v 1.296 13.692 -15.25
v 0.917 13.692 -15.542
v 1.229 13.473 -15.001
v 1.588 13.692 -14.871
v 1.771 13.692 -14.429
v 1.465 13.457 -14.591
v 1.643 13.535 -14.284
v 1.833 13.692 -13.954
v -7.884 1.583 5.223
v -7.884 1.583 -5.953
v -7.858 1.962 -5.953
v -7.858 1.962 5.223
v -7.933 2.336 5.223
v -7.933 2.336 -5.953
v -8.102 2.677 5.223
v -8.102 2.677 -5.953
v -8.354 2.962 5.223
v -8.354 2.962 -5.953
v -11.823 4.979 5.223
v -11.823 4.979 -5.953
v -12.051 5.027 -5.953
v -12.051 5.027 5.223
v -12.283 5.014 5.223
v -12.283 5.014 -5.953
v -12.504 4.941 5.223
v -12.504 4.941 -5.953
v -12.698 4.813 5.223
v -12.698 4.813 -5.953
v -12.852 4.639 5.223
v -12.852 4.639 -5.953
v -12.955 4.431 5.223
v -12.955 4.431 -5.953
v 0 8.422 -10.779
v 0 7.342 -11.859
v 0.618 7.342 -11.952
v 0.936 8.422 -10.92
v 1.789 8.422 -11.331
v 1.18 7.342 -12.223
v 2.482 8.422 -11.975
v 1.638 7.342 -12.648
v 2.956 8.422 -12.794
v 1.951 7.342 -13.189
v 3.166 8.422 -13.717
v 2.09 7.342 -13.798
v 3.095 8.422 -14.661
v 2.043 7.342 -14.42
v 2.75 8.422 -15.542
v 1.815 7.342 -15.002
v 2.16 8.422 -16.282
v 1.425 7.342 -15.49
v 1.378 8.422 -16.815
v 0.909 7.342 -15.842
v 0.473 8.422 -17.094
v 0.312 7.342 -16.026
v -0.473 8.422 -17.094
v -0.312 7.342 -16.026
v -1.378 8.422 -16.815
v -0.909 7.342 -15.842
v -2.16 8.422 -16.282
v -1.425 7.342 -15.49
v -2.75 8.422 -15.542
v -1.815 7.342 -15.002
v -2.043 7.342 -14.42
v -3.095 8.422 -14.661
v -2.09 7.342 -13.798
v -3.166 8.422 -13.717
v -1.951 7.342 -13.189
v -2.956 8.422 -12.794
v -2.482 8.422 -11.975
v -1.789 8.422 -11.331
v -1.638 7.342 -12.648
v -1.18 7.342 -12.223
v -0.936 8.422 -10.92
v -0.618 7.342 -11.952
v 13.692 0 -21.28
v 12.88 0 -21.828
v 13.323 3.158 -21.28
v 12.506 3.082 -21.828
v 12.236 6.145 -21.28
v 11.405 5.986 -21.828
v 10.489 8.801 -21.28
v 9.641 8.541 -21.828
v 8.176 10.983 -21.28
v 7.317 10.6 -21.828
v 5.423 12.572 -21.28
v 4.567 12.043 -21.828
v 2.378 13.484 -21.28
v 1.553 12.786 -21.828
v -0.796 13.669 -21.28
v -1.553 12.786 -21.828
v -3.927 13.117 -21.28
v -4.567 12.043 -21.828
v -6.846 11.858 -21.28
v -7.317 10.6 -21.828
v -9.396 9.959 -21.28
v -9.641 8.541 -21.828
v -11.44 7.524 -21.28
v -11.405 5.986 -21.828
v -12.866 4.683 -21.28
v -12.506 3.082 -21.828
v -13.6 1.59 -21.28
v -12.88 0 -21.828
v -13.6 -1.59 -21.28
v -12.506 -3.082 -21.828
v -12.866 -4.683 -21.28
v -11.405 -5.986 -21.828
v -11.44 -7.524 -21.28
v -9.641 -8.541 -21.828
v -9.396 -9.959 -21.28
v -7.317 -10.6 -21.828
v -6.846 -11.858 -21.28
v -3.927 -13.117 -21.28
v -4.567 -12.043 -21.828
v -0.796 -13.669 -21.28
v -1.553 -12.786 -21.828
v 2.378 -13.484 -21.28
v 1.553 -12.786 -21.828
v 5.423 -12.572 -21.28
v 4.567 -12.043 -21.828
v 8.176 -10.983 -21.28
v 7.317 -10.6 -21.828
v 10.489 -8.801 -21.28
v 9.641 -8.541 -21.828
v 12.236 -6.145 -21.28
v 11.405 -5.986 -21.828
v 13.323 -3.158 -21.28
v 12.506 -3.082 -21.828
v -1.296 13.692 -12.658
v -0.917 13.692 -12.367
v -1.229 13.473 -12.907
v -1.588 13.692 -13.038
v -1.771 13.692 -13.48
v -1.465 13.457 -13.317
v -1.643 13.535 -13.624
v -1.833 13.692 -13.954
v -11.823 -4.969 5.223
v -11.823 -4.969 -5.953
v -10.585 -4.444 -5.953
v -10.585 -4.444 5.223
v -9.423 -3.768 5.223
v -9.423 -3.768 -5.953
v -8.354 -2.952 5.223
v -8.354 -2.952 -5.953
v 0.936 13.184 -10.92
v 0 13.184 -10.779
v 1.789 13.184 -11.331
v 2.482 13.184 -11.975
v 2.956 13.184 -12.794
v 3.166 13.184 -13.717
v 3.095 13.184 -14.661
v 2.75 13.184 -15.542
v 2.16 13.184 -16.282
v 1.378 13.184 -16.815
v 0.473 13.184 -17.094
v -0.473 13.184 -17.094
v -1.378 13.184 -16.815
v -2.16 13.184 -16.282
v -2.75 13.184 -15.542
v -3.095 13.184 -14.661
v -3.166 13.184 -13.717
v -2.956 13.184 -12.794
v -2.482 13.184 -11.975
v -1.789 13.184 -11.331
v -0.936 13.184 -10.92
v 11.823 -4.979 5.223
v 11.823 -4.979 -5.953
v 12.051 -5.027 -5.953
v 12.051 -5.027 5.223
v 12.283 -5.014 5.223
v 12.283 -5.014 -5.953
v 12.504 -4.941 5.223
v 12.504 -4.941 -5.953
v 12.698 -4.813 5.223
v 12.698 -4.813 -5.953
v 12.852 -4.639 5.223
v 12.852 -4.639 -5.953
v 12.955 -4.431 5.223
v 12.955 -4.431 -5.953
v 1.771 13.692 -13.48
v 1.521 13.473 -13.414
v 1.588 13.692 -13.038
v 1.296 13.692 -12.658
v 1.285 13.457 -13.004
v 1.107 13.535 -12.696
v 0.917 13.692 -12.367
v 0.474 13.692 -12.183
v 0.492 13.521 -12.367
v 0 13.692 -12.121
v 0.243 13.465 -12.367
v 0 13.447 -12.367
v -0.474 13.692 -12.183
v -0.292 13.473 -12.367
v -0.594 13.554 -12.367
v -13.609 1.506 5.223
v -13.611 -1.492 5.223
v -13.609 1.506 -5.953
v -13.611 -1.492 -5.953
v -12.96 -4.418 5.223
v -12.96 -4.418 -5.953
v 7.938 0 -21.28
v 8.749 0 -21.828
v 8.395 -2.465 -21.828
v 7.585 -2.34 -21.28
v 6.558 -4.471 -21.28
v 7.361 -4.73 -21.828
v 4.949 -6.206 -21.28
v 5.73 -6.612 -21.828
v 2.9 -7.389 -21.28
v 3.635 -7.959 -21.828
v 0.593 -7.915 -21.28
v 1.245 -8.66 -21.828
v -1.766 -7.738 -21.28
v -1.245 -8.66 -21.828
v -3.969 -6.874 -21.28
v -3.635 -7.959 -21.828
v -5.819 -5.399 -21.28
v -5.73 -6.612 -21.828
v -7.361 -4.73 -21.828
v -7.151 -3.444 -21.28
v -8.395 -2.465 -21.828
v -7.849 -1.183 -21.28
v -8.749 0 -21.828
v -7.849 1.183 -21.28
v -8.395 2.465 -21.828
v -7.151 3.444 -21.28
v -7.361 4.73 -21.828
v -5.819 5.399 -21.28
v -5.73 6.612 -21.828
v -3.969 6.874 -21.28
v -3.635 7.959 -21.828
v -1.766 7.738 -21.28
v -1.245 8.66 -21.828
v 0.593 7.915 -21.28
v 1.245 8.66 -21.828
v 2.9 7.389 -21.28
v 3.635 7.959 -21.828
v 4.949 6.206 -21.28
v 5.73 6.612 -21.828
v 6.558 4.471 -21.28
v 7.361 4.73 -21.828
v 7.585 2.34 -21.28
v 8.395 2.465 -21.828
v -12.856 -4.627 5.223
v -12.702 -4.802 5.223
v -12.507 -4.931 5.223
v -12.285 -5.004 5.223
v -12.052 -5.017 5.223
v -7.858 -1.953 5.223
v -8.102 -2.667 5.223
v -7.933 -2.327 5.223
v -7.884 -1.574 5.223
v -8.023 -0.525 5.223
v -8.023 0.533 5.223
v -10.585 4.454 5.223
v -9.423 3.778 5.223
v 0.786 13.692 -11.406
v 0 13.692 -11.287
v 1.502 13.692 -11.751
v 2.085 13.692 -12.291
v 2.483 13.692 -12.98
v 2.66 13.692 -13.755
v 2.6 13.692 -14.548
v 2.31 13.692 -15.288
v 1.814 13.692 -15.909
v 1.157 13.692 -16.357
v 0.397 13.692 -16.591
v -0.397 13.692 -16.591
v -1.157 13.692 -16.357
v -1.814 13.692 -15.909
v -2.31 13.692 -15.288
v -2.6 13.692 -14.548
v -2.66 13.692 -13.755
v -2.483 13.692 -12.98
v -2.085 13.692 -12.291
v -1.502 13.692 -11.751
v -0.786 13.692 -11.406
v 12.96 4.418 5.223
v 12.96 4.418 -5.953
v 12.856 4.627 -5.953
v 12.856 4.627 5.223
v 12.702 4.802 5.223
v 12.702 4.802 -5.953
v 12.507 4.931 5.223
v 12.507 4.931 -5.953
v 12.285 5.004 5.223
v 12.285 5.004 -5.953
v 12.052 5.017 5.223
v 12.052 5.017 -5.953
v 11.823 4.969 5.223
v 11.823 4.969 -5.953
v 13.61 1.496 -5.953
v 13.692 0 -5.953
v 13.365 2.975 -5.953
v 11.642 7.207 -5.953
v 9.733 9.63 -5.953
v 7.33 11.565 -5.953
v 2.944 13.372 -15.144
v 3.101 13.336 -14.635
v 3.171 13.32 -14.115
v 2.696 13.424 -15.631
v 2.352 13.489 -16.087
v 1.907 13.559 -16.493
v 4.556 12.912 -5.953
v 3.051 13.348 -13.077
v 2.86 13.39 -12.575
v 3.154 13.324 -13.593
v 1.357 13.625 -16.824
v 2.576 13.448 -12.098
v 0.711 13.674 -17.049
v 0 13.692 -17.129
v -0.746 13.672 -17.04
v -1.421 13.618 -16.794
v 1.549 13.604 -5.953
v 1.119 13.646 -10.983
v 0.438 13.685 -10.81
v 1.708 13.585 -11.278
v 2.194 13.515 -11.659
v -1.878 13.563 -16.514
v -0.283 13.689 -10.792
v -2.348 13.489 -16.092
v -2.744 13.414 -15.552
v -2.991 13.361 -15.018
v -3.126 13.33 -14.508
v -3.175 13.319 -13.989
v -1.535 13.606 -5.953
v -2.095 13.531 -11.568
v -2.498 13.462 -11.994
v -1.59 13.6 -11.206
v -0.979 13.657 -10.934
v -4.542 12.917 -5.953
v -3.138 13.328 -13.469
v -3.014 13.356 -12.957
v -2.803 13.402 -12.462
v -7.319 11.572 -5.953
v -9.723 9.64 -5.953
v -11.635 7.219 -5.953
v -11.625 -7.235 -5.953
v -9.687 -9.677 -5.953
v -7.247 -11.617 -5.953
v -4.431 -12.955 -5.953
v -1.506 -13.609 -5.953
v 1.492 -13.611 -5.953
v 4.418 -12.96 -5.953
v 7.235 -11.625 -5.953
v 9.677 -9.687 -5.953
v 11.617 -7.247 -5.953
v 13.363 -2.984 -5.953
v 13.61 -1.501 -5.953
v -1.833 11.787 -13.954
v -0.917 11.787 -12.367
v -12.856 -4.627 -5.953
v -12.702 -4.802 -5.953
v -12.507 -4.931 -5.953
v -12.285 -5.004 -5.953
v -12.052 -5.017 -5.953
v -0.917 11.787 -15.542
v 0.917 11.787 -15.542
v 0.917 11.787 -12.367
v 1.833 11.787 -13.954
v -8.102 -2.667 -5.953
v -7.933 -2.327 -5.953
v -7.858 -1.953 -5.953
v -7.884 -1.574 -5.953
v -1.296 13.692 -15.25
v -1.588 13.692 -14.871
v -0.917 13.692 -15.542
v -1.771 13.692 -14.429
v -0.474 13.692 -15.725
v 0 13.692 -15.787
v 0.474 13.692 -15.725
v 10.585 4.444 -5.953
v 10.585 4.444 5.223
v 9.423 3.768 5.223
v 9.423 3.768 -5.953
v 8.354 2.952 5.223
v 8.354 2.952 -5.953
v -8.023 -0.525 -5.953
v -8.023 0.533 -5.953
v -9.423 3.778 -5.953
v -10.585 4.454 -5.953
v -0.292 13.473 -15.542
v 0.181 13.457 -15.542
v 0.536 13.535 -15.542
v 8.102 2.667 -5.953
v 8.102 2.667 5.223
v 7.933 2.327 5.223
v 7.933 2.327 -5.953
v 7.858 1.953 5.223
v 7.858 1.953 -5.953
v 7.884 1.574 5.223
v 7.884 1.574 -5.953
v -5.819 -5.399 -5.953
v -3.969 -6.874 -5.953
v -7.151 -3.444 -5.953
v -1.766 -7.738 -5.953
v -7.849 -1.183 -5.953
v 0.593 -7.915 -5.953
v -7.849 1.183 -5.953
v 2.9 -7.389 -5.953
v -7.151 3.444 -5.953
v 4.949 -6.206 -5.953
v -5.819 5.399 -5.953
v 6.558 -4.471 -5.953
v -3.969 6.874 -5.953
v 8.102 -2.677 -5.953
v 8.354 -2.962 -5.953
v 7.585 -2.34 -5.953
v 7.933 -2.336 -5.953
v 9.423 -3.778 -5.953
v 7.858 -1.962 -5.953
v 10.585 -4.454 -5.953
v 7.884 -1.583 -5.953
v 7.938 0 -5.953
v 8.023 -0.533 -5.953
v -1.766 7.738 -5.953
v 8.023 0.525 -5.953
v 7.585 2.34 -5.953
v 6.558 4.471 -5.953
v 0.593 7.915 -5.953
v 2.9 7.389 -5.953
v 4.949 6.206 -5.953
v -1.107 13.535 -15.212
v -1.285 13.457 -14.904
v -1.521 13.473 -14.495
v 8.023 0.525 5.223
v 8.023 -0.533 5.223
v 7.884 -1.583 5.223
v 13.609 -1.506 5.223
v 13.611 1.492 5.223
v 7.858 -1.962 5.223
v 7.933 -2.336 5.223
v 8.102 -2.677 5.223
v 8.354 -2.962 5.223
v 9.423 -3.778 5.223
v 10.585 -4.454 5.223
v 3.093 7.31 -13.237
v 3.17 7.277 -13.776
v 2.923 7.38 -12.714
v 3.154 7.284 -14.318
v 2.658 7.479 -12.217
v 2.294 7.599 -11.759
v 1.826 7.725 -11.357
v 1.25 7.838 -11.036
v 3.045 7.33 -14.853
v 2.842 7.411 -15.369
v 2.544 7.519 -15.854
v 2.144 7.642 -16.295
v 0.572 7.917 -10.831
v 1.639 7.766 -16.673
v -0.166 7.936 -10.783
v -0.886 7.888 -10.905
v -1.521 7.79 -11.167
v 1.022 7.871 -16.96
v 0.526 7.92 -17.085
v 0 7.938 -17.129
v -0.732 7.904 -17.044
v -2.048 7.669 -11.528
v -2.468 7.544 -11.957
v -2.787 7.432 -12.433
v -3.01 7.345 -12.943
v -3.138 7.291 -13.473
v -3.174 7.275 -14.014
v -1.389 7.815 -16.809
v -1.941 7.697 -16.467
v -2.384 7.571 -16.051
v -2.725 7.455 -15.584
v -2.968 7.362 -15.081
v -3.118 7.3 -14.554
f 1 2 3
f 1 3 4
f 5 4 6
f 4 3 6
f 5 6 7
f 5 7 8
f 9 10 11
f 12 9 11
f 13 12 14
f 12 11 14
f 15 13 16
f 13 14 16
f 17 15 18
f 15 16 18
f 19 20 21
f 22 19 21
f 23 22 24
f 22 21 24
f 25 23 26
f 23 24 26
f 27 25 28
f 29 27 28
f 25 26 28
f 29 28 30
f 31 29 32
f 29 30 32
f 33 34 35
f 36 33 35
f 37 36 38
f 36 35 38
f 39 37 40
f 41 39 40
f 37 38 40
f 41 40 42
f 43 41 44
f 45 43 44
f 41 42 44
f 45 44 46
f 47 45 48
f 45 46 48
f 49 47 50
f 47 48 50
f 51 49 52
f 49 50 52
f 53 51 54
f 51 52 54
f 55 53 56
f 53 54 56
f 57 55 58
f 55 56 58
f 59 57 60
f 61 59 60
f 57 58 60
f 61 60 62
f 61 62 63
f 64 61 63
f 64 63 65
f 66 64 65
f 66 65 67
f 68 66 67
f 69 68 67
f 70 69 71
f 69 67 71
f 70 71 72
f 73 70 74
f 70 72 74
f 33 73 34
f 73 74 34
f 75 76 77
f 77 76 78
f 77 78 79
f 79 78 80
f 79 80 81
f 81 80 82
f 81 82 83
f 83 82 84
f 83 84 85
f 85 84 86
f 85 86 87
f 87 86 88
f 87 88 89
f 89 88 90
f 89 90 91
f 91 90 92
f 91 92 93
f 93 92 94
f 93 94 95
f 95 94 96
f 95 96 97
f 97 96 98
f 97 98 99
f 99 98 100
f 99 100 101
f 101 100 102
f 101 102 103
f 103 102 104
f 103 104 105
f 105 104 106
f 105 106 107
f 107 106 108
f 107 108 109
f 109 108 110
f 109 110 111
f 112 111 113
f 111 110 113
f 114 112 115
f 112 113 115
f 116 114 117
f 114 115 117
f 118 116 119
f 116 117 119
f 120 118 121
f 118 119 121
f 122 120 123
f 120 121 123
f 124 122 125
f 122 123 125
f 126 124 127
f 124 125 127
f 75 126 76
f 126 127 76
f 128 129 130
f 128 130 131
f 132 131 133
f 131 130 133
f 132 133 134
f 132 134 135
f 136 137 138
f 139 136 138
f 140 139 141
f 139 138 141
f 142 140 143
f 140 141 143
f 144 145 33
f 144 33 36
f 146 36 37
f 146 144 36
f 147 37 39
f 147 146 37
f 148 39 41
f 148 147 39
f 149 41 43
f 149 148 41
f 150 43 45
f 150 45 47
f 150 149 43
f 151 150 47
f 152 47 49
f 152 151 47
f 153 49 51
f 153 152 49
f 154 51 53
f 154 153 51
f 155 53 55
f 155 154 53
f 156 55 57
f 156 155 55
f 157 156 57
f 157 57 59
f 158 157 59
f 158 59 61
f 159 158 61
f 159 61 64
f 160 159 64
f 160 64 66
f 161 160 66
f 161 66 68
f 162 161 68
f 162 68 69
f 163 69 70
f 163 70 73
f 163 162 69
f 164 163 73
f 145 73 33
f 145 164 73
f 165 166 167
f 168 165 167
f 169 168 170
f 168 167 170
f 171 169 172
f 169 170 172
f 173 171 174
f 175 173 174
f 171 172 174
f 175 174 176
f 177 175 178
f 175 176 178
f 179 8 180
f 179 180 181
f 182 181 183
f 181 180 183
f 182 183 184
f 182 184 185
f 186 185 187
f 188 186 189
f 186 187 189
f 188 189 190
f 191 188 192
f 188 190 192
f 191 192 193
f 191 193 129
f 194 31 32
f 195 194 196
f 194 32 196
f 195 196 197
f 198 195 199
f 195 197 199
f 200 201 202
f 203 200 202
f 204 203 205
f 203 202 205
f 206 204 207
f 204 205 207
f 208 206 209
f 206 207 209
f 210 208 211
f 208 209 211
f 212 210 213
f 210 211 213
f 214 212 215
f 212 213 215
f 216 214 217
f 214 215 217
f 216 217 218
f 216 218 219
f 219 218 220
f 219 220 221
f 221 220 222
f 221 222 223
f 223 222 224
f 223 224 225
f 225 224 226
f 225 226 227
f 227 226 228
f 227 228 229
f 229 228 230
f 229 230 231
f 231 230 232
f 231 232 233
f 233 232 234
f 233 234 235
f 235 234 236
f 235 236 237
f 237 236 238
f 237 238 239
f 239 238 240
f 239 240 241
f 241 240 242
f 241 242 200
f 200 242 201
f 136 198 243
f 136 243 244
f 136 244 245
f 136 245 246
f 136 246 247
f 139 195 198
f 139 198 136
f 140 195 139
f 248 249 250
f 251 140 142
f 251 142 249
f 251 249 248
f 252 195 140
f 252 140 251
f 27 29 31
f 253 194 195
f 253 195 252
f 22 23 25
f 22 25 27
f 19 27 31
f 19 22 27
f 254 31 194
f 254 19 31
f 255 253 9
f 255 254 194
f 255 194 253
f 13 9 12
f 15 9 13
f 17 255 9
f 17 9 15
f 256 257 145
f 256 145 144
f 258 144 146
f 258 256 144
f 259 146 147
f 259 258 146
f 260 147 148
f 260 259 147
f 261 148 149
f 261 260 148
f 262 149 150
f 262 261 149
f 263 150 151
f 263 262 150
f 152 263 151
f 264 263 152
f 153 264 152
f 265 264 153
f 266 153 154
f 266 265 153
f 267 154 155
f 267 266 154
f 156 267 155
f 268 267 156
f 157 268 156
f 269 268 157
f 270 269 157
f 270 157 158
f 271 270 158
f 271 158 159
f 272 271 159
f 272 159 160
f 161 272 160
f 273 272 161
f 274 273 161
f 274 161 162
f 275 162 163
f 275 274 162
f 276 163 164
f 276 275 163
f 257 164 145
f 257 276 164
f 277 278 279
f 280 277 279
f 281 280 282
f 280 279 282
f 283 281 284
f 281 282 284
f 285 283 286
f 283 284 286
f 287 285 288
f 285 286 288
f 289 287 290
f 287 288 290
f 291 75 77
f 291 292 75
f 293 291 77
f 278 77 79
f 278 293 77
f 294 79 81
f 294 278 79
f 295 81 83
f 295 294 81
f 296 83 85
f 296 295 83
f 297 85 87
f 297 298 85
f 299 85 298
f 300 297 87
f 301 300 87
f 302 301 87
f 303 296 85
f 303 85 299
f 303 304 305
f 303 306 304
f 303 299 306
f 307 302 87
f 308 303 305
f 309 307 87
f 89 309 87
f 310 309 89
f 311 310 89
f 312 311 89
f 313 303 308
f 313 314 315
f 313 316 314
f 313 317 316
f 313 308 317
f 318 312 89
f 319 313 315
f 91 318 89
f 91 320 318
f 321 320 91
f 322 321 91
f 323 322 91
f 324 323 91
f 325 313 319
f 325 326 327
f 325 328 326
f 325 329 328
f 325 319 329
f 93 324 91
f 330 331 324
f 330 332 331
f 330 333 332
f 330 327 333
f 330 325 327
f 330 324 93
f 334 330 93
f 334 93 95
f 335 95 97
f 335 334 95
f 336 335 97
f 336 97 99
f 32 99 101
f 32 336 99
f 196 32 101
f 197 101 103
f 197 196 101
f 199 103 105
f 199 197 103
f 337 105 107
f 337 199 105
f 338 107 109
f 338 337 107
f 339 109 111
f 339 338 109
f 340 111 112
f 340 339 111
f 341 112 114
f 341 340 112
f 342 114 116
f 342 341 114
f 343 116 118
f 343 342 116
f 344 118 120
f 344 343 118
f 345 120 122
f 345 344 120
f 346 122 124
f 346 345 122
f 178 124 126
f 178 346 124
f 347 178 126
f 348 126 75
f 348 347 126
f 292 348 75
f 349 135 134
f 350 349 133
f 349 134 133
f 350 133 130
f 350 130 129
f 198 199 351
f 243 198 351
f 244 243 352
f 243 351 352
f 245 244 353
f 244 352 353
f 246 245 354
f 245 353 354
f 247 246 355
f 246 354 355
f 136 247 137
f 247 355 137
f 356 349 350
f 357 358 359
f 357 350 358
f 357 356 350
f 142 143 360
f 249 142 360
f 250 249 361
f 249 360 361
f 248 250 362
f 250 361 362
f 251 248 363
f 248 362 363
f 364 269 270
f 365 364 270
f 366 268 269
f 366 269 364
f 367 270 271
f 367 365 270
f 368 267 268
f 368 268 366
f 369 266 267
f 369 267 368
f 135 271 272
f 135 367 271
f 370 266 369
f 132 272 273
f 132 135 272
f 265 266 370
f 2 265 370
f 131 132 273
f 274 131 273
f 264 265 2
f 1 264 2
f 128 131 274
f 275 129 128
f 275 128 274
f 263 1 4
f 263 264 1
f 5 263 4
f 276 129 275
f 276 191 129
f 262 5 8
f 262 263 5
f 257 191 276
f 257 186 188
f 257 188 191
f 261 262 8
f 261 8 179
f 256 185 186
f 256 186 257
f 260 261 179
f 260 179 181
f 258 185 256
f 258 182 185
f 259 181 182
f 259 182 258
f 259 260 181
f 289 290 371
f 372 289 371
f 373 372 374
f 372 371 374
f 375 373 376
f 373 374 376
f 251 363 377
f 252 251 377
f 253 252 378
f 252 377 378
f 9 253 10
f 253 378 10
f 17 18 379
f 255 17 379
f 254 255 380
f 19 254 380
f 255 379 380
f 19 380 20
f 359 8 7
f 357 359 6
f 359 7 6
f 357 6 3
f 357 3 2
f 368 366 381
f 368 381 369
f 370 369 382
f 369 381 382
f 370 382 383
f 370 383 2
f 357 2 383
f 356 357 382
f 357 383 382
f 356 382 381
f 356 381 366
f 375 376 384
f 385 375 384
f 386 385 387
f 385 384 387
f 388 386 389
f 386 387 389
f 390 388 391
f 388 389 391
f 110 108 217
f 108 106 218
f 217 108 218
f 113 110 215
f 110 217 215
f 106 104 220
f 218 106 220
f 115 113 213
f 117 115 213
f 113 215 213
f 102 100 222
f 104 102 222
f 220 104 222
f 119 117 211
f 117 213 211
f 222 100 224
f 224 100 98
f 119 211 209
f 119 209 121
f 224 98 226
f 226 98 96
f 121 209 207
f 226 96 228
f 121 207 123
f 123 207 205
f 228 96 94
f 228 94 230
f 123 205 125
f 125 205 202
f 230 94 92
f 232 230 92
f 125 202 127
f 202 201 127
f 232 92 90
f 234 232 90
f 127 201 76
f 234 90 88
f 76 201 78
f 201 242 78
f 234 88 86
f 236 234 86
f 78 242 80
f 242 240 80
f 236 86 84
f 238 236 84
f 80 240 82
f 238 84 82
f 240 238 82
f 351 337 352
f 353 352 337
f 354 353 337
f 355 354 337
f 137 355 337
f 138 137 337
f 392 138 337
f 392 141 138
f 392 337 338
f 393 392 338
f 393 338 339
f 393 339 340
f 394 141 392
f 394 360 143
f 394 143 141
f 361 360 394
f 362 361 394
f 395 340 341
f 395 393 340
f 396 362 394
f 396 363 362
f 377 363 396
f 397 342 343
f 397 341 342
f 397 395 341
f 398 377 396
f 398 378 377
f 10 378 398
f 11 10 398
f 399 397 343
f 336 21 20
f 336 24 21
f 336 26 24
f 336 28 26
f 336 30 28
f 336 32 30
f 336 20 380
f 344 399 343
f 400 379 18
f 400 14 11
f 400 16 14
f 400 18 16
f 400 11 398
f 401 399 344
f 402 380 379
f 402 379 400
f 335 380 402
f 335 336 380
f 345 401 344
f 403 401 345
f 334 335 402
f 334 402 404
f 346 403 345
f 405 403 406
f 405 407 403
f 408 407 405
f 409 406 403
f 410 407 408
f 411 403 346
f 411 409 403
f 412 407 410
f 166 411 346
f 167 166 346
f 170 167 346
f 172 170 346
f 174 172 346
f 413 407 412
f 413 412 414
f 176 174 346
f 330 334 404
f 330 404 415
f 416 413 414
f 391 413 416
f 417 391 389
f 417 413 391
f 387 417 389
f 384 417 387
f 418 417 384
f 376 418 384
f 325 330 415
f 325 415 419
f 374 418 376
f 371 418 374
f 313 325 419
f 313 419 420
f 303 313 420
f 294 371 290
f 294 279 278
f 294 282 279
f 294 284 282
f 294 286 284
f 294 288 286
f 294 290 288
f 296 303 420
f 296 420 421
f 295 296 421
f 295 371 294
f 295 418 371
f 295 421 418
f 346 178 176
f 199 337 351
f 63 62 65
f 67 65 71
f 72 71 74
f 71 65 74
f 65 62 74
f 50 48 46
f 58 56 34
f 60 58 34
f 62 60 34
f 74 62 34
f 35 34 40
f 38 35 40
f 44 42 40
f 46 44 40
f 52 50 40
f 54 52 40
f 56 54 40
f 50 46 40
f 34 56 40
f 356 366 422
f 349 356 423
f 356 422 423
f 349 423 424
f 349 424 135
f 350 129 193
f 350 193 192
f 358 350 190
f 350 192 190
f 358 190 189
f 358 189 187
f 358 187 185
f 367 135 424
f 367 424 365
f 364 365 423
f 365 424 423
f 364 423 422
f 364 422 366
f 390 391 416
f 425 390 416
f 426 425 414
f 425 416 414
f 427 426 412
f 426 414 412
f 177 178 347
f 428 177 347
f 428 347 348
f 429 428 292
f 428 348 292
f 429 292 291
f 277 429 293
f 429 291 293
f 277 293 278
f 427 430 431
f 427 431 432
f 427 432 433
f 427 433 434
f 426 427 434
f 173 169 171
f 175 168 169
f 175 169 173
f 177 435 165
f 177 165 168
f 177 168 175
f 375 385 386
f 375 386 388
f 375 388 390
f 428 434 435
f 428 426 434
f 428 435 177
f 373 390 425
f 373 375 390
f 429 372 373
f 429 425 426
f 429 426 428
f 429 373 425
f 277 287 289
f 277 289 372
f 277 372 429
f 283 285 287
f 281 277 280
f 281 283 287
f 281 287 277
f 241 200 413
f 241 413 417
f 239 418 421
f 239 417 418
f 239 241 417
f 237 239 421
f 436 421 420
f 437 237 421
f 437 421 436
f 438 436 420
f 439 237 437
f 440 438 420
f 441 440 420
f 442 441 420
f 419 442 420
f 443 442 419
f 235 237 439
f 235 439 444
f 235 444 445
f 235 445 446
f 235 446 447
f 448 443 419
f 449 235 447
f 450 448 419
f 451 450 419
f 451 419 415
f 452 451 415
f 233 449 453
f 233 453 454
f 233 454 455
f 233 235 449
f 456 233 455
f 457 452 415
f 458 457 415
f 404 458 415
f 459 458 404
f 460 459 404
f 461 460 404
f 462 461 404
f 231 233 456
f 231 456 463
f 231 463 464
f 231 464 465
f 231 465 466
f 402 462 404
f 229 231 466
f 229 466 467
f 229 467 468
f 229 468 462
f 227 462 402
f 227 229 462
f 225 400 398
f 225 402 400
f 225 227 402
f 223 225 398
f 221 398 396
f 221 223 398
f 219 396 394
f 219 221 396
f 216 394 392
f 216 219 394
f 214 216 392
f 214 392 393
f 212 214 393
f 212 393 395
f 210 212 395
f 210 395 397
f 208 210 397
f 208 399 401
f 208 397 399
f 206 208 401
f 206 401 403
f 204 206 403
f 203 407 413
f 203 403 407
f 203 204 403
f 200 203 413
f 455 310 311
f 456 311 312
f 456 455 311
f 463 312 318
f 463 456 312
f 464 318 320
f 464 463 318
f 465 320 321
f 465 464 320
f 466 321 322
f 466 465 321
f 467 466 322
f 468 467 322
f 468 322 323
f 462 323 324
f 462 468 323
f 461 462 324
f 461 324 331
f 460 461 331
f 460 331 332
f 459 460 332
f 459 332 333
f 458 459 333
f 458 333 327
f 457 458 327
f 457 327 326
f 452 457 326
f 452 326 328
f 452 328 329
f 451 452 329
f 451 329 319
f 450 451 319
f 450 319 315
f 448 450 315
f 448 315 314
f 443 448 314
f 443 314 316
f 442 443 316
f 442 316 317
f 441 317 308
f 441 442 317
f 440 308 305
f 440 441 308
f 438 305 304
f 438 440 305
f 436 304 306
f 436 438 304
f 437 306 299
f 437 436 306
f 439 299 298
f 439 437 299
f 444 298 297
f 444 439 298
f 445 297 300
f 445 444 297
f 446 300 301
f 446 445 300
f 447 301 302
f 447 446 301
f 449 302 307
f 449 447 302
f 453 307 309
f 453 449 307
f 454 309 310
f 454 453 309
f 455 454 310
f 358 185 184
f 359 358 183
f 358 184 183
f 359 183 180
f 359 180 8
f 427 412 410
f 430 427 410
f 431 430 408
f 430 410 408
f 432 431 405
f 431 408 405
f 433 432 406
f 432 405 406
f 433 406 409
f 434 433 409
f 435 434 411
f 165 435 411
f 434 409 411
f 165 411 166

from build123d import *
from OCP.BRepFilletAPI import BRepFilletAPI_MakeChamfer

# Parameters (mm, degrees)
BOSS_EXTRUDE1_START     = -5.953125
SKETCH1_R               = 13.6921875
BOSS_EXTRUDE1_DEPTH     = 15.875
BOSS_EXTRUDE5_START     = 11.176
BOSS_EXTRUDE5_DEPTH     = 11.176
MOVE_START              = -5.953125
MOVE_FACE1_DEPTH        = 11.176
MOVE_FACE1_2_DEPTH      = 11.176
CIRPATTERN3_START       = -5.953125
CIRPATTERN3_DEPTH       = 11.176
CUT_EXTRUDE5_DEPTH      = 30.179085628
CUT_EXTRUDE5_DEPTH_BACK = 30.179085628
SKETCH15_R              = 7.9375
CHAMFER1_SIZE           = 0.5476875
CHAMFER1_SIZE2          = 0.81198011
SKETCH5_R               = 3.175
CUT_EXTRUDE2_DEPTH      = 30.179085628
SKETCH6_R               = 3.175
BOSS_EXTRUDE3_DEPTH     = 6.35
CUT_EXTRUDE3_DEPTH      = 1.905
CHAMFER3_SIZE           = 0.508
CHAMFER4_SIZE           = 1.0795


# Read off the part's stored shape, not the designer's step: Move Face1, CirPattern3
with BuildPart() as part:
    # Sketch1 → Boss-Extrude1 (new body)
    with BuildSketch(Plane.XY.offset(BOSS_EXTRUDE1_START)):
        Circle(SKETCH1_R)
    extrude(amount=-BOSS_EXTRUDE1_DEPTH)

    # Sketch11 → Boss-Extrude5 (add)
    with BuildSketch(Plane.XY.offset(-5.953125).offset(BOSS_EXTRUDE5_START)):
        with BuildLine():
            ThreePointArc((-1.582501, -7.883505579), (-0.004369034, -8.040686324), (1.573762932, -7.883505579))
            ThreePointArc((1.573762932, -7.883505579), (2.326569083, -7.932638836), (2.952339417, -8.353996958))
            ThreePointArc((2.952339417, -8.353996958), (4.124174772, -9.993538922), (4.969226713, -11.823069782))
            ThreePointArc((4.969226713, -11.823069782), (4.930575443, -12.50660364), (4.417578974, -12.959976641))
            ThreePointArc((4.417578974, -12.959976641), (-0.006979455, -13.692185721), (-4.430789112, -12.955466274))
            ThreePointArc((-4.430789112, -12.955466274), (-4.941191352, -12.503649266), (-4.979409431, -11.823069782))
            ThreePointArc((-4.979409431, -11.823069782), (-4.13390788, -9.993483356), (-2.961583815, -8.353996958))
            ThreePointArc((-2.961583815, -8.353996958), (-2.335546152, -7.932611995), (-1.582501, -7.883505579))
        make_face()
    extrude(amount=-BOSS_EXTRUDE5_DEPTH)

    # Move Face1 outline → Move Face1 (cut)
    with BuildSketch(Plane.XY.offset(MOVE_START)):
        with BuildLine():
            ThreePointArc((-4.430789112, -12.955466274), (-0.006979455, -13.692185721), (4.417578974, -12.959976641))
            ThreePointArc((4.417578974, -12.959976641), (4.930575443, -12.50660364), (4.969226713, -11.823069782))
            ThreePointArc((4.969226713, -11.823069782), (4.124174772, -9.993538922), (2.952339417, -8.353996958))
            ThreePointArc((2.952339417, -8.353996958), (2.326569083, -7.932638836), (1.573762932, -7.883505579))
            ThreePointArc((1.573762932, -7.883505579), (-0.004369034, -8.040686324), (-1.582501, -7.883505579))
            ThreePointArc((-1.582501, -7.883505579), (-2.335546152, -7.932611995), (-2.961583815, -8.353996958))
            ThreePointArc((-2.961583815, -8.353996958), (-4.13390788, -9.993483356), (-4.979409431, -11.823069782))
            ThreePointArc((-4.979409431, -11.823069782), (-4.941191352, -12.503649266), (-4.430789112, -12.955466274))
        make_face()
    extrude(amount=MOVE_FACE1_DEPTH, mode=Mode.SUBTRACT)

    # Move Face1 2 outline → Move Face1 2 (add)
    with BuildSketch(Plane.XY.offset(MOVE_START)):
        with BuildLine():
            ThreePointArc((7.883505579, -1.582501), (7.932611995, -2.335546152), (8.353996958, -2.961583815))
            ThreePointArc((8.353996958, -2.961583815), (9.993483356, -4.13390788), (11.823069782, -4.979409431))
            ThreePointArc((11.823069782, -4.979409431), (12.503649266, -4.941191352), (12.955466274, -4.430789112))
            ThreePointArc((12.955466274, -4.430789112), (13.692185721, -0.006979455), (12.959976641, 4.417578974))
            ThreePointArc((12.959976641, 4.417578974), (12.50660364, 4.930575443), (11.823069782, 4.969226713))
            ThreePointArc((11.823069782, 4.969226713), (9.993538922, 4.124174772), (8.353996958, 2.952339417))
            ThreePointArc((8.353996958, 2.952339417), (7.932638836, 2.326569083), (7.883505579, 1.573762932))
            ThreePointArc((7.883505579, 1.573762932), (8.040686324, -0.004369034), (7.883505579, -1.582501))
        make_face()
    extrude(amount=MOVE_FACE1_2_DEPTH)

    # CirPattern3 outline → CirPattern3 (add)
    with BuildSketch(Plane.XY.offset(CIRPATTERN3_START)):
        with BuildLine():
            ThreePointArc((-7.883505579, 1.582501), (-7.932611995, 2.335546152), (-8.353996958, 2.961583815))
            ThreePointArc((-8.353996958, 2.961583815), (-9.993483356, 4.13390788), (-11.823069782, 4.979409431))
            ThreePointArc((-11.823069782, 4.979409431), (-12.503649266, 4.941191352), (-12.955466274, 4.430789112))
            ThreePointArc((-12.955466274, 4.430789112), (-13.692185721, 0.006979455), (-12.959976641, -4.417578974))
            ThreePointArc((-12.959976641, -4.417578974), (-12.50660364, -4.930575443), (-11.823069782, -4.969226713))
            ThreePointArc((-11.823069782, -4.969226713), (-9.993538922, -4.124174772), (-8.353996958, -2.952339417))
            ThreePointArc((-8.353996958, -2.952339417), (-7.932638836, -2.326569083), (-7.883505579, -1.573762932))
            ThreePointArc((-7.883505579, -1.573762932), (-8.040686324, 0.004369034), (-7.883505579, 1.582501))
        make_face()
    extrude(amount=CIRPATTERN3_DEPTH)

    # Sketch15 → Cut-Extrude5 (cut, two sides: drawn at the far end of the back side and taken through both)
    with BuildSketch(Plane.XY.offset(-CUT_EXTRUDE5_DEPTH_BACK)):
        Circle(SKETCH15_R)
    extrude(amount=CUT_EXTRUDE5_DEPTH + CUT_EXTRUDE5_DEPTH_BACK, mode=Mode.SUBTRACT)

    # Chamfer1: one chamfer whose edges measure the first distance from different faces: ONE call of the kernel's chamfer builder (chamfer() names one face for all edges)
    chamfer1_edges_1 = [part.edges().sort_by_distance(p)[0] for p in [
        (-13.6921875, 0, -21.828125),
    ]]
    chamfer1_side_1 = [part.faces().sort_by_distance(p)[0] for p in [
        (-13.6921875, 0, -13.890625),
    ]]
    chamfer1_edges_2 = [part.edges().sort_by_distance(p)[0] for p in [
        (-7.9375, 0, -21.828125),
    ]]
    chamfer1_side_2 = [part.faces().sort_by_distance(p)[0] for p in [
        (-7.9375, 0, -13.890625),
    ]]
    chamfer1 = BRepFilletAPI_MakeChamfer(part.part.solid().wrapped)
    for e in chamfer1_edges_1:
        chamfer1.Add(CHAMFER1_SIZE, CHAMFER1_SIZE2, e.wrapped, chamfer1_side_1[0].wrapped)  # the first distance lies on this face
    for e in chamfer1_edges_2:
        chamfer1.Add(CHAMFER1_SIZE, CHAMFER1_SIZE2, e.wrapped, chamfer1_side_2[0].wrapped)  # the first distance lies on this face
    add(Compound.cast(chamfer1.Shape()), mode=Mode.REPLACE)

    # Sketch5 → Cut-Extrude2 (cut, through all)
    with BuildSketch(Plane(origin=(0, 0, 0), x_dir=(1, 0, 0), z_dir=(0, 1, 0))):
        with Locations(Location((0, 13.954125, 0), (0, 0, 90))):
            Circle(SKETCH5_R)
    extrude(amount=CUT_EXTRUDE2_DEPTH, mode=Mode.SUBTRACT)


with BuildPart() as body_2:
    # Sketch6 → Boss-Extrude3 (new body)
    with BuildSketch(Plane(origin=(0, 13.6921875, 0), x_dir=(-1, 0, 0), z_dir=(0, 1, 0))):
        with Locations(Location((0, -13.954125, 0), (0, 0, 90))):
            Circle(SKETCH6_R)
    extrude(amount=-BOSS_EXTRUDE3_DEPTH)

    # Sketch8 → Cut-Extrude3 (cut)
    with BuildSketch(Plane(origin=(0, 13.6921875, 0), x_dir=(1, 0, 0), z_dir=(0, 1, 0))):
        Polygon((0.916543552, 12.366625), (1.833087105, 13.954125), (0.916543552, 15.541625), (-0.916543552, 15.541625), (-1.833087105, 13.954125), (-0.916543552, 12.366625), align=None)
    extrude(amount=-CUT_EXTRUDE3_DEPTH, mode=Mode.SUBTRACT)

    # Cut-Extrude4 cone 1 section (through the dimple's axis) → Cut-Extrude4 (revolve, cut)
    with BuildSketch(Plane(origin=(0, 13.6921875, -13.954125), x_dir=(0, 0, 1), z_dir=(1, 0, 0))):
        Polygon((0, 0), (1.833087105, 0), (0, 1.833087105), align=None)
    revolve(axis=Axis((0, 13.6921875, -13.954125), (0, -1, 0)), mode=Mode.SUBTRACT)

    # Chamfer3
    chamfer3_edges = [body_2.edges().sort_by_distance(p)[0] for p in [
        (0, 13.6921875, -17.129125),
    ]]
    chamfer(chamfer3_edges, length=CHAMFER3_SIZE)

    # Chamfer4
    chamfer4_edges = [body_2.edges().sort_by_distance(p)[0] for p in [
        (0, 7.3421875, -17.129125),
    ]]
    chamfer(chamfer4_edges, length=CHAMFER4_SIZE)


solid = Compound([part.part, body_2.part])
